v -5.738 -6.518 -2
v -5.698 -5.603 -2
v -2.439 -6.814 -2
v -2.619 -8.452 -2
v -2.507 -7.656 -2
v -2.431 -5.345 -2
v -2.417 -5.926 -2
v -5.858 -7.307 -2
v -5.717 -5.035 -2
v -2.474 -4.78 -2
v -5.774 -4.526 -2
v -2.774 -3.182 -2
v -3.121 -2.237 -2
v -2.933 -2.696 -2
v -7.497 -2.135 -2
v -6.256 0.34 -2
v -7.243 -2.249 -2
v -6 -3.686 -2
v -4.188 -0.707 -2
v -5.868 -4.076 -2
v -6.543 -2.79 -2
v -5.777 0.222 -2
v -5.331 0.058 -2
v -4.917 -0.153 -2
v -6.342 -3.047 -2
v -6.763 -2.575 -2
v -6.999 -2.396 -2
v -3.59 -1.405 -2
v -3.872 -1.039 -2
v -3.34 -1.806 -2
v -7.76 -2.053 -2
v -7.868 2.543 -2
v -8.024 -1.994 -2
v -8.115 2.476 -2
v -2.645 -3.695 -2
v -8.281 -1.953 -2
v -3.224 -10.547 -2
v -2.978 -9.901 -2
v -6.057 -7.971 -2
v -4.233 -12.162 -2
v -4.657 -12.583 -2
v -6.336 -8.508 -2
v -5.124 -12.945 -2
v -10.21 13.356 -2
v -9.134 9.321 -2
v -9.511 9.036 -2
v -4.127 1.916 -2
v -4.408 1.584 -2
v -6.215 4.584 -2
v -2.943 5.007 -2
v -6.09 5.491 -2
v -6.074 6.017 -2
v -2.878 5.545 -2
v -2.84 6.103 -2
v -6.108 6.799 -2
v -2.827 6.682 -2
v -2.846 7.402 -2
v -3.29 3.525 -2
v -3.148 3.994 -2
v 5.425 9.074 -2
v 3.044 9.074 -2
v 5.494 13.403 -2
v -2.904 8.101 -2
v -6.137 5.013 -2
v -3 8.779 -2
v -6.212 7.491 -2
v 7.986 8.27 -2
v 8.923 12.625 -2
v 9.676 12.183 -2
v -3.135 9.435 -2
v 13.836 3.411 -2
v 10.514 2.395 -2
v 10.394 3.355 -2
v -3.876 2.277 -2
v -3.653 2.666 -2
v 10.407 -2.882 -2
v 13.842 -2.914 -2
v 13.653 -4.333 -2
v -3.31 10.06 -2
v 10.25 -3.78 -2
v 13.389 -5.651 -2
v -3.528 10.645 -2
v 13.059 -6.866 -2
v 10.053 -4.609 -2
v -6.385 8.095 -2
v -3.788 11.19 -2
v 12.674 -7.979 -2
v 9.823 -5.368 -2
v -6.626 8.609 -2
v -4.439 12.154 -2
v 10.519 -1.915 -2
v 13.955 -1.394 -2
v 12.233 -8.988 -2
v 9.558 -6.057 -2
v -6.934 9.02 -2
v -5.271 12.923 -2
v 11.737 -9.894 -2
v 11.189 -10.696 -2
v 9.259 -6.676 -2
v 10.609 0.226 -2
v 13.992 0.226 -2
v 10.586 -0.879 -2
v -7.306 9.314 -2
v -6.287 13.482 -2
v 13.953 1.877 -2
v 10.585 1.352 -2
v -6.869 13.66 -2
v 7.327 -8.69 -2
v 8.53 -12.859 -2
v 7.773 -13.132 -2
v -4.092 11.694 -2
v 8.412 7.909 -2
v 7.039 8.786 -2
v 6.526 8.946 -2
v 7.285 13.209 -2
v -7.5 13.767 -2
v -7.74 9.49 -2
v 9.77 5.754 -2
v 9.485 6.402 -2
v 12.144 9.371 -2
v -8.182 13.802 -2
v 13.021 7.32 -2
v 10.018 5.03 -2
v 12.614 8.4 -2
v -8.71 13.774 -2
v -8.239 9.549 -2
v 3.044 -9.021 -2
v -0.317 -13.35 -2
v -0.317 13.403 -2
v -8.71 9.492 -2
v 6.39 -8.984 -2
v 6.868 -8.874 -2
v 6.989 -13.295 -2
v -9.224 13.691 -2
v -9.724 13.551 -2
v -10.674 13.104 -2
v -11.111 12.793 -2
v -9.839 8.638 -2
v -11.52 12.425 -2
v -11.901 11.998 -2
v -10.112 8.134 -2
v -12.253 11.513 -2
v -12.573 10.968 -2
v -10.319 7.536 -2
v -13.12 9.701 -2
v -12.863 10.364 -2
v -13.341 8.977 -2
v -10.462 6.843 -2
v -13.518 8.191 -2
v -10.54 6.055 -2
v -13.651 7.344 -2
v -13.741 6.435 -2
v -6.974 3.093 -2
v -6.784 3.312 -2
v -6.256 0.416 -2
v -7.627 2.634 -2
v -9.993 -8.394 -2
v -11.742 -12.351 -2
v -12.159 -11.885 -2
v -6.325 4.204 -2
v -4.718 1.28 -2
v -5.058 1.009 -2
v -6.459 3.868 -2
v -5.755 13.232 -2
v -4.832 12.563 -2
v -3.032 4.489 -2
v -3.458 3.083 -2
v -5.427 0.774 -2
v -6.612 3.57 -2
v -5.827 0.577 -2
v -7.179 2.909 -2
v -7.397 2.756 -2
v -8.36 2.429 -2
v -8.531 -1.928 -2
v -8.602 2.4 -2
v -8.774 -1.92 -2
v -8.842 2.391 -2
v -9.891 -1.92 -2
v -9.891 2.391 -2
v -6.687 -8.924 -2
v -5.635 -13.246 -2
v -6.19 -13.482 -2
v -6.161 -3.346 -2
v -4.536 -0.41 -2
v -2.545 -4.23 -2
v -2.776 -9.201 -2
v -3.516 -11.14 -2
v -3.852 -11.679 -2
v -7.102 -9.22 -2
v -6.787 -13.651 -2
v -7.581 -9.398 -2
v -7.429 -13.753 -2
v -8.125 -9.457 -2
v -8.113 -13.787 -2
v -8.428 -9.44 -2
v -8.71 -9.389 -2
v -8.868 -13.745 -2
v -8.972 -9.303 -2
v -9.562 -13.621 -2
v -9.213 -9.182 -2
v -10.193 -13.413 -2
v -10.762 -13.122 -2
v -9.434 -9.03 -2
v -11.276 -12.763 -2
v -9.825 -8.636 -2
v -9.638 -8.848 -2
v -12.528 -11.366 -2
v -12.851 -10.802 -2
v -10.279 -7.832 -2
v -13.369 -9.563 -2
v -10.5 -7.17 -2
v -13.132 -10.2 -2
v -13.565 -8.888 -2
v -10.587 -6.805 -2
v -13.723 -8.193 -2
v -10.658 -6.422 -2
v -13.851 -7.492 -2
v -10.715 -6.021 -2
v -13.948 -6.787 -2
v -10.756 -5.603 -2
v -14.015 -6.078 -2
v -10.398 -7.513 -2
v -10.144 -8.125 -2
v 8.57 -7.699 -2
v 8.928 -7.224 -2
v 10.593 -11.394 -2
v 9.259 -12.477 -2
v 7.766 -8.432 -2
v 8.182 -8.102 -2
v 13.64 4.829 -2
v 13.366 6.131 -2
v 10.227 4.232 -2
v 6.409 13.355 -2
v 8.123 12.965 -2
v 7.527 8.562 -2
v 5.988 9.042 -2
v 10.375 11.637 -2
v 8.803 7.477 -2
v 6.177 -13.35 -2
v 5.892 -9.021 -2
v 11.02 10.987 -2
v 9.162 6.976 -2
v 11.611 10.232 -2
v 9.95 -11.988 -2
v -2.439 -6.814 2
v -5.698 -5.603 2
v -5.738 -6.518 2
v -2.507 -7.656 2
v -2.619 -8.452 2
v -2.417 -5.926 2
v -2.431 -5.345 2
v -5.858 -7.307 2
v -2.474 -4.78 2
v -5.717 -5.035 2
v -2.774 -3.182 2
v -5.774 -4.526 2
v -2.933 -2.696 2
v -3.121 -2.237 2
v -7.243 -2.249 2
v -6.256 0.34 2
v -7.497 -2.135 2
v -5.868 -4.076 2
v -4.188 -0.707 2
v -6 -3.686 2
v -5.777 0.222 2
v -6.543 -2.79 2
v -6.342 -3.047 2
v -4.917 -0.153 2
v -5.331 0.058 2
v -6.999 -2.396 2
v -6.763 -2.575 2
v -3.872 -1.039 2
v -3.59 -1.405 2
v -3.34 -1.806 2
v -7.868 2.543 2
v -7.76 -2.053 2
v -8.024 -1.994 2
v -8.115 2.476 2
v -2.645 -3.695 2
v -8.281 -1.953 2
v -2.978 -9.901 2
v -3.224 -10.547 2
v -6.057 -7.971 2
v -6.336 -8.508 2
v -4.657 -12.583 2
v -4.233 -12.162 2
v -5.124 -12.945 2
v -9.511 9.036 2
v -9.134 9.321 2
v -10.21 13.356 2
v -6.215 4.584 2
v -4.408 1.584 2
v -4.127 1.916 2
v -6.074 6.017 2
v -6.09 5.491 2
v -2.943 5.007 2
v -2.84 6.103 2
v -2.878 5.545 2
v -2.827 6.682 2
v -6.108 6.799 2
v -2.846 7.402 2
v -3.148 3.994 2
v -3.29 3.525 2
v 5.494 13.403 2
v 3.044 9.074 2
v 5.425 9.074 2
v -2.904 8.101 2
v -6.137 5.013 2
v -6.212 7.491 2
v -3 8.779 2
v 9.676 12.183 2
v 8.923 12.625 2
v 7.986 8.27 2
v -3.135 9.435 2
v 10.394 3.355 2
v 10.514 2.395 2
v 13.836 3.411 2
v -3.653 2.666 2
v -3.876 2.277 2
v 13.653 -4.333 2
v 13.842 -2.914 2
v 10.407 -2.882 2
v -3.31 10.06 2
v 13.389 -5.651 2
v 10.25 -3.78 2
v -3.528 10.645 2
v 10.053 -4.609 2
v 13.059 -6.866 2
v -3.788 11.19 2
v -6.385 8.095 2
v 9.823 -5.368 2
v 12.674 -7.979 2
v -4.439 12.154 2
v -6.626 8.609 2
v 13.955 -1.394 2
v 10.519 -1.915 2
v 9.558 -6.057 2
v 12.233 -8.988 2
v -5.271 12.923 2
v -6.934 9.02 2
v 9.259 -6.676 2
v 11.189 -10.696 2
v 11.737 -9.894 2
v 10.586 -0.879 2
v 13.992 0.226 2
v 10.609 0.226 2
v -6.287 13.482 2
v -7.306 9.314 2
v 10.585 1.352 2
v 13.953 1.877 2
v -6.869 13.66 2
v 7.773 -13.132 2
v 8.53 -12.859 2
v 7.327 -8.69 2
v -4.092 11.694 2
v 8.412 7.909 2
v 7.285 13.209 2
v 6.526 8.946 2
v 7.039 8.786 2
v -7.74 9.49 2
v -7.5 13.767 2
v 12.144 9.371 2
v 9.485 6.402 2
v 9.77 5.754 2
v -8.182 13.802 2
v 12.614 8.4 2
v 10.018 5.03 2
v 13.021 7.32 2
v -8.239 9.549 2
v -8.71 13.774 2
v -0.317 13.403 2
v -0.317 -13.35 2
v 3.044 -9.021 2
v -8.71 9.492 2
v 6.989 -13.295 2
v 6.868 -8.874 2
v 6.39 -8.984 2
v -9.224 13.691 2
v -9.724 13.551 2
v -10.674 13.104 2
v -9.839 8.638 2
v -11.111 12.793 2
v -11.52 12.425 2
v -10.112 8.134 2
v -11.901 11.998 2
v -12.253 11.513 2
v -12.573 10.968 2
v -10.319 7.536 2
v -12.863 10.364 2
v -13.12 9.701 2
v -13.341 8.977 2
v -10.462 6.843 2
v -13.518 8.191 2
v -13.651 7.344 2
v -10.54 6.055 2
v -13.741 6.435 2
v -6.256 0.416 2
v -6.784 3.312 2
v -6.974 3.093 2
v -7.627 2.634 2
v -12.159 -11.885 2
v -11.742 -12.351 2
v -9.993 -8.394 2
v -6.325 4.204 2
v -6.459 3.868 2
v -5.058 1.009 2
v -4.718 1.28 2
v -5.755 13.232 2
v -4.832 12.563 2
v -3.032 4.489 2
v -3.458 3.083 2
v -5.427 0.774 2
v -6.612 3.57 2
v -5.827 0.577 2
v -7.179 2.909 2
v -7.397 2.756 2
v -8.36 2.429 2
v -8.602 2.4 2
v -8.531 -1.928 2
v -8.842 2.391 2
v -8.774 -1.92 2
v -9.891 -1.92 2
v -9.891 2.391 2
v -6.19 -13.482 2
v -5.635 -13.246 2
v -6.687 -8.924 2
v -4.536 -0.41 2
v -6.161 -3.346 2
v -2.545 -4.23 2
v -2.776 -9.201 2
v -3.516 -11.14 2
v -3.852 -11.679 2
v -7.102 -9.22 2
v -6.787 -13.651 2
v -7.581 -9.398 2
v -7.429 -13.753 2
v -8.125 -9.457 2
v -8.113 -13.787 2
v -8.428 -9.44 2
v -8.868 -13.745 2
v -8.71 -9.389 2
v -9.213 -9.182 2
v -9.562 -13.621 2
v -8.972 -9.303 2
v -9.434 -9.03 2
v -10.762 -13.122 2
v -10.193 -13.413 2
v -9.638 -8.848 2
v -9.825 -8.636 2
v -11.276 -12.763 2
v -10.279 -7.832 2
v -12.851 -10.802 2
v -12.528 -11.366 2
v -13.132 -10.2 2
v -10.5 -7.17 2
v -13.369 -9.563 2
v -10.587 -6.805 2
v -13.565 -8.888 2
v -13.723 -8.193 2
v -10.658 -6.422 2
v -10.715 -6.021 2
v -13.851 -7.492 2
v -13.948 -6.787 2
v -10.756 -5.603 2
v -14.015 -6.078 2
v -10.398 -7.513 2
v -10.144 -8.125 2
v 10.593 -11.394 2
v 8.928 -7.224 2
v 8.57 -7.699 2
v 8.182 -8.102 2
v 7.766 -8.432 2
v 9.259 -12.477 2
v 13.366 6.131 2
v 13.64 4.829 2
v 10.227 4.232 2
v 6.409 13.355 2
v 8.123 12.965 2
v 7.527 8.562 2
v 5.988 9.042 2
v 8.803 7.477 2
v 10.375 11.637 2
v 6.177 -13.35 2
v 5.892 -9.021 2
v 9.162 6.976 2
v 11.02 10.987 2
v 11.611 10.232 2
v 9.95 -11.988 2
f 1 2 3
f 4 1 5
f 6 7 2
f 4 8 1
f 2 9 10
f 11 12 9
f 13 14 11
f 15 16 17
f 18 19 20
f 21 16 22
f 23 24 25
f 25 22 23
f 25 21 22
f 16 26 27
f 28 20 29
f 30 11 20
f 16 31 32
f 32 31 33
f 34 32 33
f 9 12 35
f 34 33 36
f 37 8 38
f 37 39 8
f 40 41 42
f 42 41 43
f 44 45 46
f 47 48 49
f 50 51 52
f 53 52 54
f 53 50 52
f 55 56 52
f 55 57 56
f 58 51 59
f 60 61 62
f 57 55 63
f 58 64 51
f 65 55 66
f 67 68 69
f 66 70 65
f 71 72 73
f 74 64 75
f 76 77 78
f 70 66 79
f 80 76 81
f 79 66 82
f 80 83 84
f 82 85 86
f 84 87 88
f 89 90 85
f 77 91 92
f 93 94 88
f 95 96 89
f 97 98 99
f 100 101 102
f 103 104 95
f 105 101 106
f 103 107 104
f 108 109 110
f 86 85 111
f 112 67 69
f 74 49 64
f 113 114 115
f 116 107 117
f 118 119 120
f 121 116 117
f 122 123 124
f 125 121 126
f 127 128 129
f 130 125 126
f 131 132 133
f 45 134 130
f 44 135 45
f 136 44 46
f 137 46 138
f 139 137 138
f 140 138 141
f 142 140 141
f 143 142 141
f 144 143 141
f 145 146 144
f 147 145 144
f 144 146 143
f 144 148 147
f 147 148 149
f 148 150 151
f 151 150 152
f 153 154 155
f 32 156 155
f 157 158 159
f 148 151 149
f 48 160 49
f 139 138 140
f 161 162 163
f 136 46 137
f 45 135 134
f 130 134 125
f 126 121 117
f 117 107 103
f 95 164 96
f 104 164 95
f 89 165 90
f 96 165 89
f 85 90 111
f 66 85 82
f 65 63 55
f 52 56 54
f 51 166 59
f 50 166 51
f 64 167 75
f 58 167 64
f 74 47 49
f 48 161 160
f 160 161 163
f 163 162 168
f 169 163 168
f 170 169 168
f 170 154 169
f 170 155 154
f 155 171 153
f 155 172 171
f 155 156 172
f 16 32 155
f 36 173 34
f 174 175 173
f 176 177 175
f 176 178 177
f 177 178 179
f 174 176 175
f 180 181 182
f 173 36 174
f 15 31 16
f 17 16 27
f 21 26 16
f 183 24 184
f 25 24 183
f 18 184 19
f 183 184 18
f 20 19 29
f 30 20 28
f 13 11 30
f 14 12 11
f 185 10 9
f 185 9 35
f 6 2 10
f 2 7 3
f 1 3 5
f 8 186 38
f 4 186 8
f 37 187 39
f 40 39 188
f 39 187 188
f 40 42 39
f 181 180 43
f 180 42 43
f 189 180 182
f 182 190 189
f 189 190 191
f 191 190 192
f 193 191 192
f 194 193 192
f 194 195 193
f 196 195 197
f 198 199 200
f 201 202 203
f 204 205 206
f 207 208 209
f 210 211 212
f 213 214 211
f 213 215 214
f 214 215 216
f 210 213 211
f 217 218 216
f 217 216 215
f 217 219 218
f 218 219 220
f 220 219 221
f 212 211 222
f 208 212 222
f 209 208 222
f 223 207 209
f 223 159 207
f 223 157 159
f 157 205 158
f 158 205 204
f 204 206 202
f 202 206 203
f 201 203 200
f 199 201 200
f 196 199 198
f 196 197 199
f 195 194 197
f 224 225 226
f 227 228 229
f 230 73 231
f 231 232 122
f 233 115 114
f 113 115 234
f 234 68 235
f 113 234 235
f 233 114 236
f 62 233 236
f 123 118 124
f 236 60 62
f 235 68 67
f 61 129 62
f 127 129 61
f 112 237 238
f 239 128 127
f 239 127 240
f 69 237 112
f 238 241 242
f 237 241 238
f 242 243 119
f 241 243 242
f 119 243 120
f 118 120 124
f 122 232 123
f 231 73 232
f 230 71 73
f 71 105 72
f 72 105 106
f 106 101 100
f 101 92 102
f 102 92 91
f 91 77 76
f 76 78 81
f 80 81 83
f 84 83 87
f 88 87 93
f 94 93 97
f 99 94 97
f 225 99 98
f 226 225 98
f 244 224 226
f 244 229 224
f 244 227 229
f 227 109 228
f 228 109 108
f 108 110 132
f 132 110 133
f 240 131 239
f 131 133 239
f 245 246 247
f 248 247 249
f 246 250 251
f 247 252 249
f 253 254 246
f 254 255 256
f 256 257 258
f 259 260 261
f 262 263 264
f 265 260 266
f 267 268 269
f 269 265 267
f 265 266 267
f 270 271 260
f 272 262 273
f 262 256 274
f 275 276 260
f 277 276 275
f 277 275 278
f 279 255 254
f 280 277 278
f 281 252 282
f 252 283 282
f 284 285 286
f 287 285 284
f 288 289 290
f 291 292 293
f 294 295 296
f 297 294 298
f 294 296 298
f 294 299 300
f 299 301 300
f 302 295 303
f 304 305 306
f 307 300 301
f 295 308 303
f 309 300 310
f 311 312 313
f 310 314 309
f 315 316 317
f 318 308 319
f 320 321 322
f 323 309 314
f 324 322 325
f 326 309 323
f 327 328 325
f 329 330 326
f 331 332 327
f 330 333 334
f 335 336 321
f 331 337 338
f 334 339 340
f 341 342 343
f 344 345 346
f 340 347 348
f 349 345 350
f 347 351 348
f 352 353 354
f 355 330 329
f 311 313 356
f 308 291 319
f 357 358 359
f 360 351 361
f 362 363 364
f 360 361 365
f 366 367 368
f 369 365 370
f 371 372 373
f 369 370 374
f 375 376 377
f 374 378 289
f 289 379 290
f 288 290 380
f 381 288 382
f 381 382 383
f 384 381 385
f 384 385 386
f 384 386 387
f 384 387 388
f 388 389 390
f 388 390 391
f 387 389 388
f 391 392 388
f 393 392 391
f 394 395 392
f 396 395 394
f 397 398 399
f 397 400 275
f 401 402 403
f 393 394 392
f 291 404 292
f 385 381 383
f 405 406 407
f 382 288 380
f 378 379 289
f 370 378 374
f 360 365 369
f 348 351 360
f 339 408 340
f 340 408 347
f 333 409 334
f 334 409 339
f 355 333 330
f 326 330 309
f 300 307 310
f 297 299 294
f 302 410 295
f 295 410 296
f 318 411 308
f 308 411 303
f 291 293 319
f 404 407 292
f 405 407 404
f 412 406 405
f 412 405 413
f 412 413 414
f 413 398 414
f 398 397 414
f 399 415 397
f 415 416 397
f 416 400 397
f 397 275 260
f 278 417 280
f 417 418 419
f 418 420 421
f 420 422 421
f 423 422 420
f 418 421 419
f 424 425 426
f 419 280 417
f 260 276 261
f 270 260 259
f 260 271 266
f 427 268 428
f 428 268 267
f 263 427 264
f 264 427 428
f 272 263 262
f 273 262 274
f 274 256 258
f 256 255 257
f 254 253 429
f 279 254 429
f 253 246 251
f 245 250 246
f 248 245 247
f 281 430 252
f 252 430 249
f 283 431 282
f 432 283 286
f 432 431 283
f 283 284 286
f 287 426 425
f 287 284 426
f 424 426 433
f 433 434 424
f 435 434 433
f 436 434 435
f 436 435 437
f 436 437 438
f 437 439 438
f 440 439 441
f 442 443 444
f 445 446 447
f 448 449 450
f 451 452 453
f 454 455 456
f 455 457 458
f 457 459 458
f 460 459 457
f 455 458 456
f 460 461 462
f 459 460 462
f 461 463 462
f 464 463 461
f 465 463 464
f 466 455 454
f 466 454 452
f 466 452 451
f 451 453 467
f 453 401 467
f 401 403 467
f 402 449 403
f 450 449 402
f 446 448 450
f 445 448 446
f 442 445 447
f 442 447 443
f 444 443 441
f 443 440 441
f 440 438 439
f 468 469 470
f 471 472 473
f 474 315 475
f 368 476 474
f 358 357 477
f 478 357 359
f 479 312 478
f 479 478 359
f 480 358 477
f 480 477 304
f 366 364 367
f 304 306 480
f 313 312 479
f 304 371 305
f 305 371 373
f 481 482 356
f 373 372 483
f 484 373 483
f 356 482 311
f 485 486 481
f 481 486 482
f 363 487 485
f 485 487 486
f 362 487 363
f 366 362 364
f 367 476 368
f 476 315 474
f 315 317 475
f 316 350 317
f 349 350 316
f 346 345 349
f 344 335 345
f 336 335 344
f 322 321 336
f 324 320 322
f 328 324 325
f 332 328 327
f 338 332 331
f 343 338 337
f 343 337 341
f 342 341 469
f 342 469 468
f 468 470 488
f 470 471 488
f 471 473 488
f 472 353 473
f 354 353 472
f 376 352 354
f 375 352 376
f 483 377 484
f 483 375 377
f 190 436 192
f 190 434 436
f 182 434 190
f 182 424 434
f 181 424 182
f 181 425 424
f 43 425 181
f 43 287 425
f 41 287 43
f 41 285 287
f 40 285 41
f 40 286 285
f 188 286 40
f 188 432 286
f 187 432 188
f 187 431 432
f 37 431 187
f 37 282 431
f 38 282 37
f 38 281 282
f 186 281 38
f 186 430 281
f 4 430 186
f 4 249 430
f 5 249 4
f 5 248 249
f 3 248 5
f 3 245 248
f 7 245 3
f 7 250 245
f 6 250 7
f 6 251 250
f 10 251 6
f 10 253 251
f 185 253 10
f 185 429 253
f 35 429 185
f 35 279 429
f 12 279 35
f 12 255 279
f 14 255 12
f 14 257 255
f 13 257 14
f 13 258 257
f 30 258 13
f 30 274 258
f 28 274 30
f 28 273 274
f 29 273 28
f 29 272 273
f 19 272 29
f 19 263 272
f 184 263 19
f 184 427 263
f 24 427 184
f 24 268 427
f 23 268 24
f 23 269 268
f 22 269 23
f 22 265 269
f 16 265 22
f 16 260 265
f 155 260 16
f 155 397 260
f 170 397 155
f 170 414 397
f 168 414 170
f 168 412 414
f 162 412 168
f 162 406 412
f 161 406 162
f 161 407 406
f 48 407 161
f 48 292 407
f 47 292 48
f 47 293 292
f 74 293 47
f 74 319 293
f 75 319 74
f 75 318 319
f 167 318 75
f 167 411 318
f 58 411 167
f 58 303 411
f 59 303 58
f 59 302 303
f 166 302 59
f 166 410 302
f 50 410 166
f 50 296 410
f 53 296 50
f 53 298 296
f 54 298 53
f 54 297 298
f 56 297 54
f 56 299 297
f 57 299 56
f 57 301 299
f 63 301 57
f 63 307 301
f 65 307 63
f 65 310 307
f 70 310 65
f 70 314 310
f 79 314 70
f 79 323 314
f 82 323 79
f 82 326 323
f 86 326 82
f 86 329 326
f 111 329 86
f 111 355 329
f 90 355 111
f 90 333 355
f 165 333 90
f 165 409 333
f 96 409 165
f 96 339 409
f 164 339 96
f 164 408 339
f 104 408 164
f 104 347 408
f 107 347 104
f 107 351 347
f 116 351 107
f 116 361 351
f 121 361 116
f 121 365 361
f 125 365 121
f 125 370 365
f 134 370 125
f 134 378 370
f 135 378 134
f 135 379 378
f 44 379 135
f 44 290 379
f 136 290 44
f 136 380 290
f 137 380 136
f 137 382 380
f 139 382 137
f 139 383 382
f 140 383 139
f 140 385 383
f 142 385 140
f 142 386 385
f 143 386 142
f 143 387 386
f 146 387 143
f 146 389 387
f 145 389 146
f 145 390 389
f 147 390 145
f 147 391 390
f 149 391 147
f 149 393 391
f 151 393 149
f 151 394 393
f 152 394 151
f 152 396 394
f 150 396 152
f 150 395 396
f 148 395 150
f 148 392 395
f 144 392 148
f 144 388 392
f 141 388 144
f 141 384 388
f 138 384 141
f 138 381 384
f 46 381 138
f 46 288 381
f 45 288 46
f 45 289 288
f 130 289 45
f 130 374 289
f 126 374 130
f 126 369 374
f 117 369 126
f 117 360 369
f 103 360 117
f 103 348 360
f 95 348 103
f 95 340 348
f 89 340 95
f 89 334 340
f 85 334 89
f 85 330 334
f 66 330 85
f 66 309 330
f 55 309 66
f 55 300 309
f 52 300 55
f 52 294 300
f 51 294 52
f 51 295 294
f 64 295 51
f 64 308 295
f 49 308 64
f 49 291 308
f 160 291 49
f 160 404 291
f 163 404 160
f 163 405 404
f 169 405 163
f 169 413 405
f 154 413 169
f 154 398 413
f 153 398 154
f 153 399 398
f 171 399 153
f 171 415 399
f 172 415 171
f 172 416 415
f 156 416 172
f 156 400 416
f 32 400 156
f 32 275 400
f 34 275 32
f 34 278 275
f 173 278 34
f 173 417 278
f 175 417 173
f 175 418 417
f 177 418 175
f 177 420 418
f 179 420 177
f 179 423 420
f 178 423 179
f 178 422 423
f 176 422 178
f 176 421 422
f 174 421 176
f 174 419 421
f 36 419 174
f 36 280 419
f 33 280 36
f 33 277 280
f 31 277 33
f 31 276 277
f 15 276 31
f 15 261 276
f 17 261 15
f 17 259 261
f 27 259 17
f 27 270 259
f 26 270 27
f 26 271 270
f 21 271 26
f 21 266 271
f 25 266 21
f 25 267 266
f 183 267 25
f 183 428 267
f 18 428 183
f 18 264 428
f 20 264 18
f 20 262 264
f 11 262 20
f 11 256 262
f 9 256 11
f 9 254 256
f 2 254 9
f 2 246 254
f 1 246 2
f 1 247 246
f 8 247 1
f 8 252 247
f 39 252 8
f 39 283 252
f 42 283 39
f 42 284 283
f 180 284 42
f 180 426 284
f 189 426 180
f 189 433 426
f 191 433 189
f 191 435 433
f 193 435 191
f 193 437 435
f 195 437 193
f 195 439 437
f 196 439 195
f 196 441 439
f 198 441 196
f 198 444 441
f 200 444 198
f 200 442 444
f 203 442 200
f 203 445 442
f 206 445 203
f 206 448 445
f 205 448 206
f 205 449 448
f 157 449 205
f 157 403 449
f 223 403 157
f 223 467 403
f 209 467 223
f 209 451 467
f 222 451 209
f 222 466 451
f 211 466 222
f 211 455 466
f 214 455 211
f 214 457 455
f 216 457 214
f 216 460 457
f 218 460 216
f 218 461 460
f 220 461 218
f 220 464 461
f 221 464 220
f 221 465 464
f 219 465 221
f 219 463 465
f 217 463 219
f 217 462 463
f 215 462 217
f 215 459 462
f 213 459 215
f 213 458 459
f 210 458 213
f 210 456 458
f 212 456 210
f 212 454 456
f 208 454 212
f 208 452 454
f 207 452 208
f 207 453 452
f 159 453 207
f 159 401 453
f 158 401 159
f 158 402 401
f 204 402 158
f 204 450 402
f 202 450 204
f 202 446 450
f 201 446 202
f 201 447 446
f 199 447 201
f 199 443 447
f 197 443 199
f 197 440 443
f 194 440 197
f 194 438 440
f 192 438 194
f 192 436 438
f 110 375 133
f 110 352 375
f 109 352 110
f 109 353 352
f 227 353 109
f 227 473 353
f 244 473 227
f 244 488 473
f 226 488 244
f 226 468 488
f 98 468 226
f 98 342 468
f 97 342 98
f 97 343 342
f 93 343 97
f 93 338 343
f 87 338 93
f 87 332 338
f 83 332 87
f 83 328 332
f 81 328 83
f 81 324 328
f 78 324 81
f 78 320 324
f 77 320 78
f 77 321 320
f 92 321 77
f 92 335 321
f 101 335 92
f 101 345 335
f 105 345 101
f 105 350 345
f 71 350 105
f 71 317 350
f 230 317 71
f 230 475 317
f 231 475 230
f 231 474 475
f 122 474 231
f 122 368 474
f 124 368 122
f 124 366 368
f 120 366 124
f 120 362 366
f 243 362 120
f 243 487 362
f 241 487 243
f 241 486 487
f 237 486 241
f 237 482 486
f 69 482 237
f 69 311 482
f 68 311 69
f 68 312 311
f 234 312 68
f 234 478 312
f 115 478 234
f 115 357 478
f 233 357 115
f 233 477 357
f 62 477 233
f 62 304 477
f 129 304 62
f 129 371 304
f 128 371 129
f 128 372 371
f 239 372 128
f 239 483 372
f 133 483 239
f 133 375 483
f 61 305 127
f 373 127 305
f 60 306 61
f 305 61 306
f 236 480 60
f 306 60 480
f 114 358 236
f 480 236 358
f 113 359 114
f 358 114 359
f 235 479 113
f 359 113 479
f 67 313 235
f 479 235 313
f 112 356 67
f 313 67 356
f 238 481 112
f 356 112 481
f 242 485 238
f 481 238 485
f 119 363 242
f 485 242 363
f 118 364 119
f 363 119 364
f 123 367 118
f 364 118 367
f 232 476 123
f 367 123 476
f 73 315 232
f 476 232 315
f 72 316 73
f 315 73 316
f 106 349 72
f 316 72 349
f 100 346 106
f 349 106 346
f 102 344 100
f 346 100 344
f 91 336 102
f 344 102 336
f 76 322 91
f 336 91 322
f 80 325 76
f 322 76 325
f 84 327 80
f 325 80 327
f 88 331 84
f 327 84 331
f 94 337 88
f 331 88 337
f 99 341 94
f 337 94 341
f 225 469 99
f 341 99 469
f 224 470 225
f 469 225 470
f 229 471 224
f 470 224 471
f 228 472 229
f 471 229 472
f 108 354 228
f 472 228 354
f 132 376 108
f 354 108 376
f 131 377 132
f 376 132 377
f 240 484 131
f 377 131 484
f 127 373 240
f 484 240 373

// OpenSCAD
// file: modules.scad
c_right_block_lower = [10/255, 10/255, 200/255];
c_right_block_upper = [10/255, 10/255, 100/255];
c_text = [235/255, 69/255, 56/255];
c_left_block = [10/255, 200/255, 10/255];
c_fragment = [0.0, 0.5, 0.5];

module left_logo() {
     translate([-0.5, 0.5, 0])
          translate([-14.05, -13.85, -2])
          color (c_text)
          scale([1.2, 2, 1])
          linear_extrude(4)
          text("3D", font="Liberation Sans:style=Bold", size=14);
}

module left_block() {
     translate([-15, -30, -10]) cube ([30, 60, 40]);
     translate([5, -50, -10]) cube ([10, 100, 40]);

     difference() {
          translate([5, 30, -10]) cylinder(r=20, h=40, $fn=100);
          translate([15, -50, -11]) cube ([150, 100, 42]);
     }
     difference() {
          translate([5, -30, -10]) cylinder(r=20, h=40, $fn=100);
          translate([15, -50, -11]) cube ([150, 100, 42]);       
     }
}

module left_block_puzzle() {
     difference(){
     difference(){
     translate([-15, 0, 0])
     {
          color (c_left_block)
               union() {
                    left_block();
                    translate([25, 0, -10]) cylinder(r=20, h=40, $fn=100);
               }
     }
     color(c_left_block)
          translate([10, 0, 30]) 
          left_logo();
     }
     color(c_left_block)
          translate([10, 0, -10]) 
          rotate([180, 0, 0])
          left_logo();
     }
}

module right_logo() {
     translate([-0.58, 0.4, 0])
          translate([-62.715, -14.29, -2])
          color (c_text)
          scale([1.2, 2, 1])
          linear_extrude(4)
          text("Assemblies", font="Liberation Sans:style=Bold", size=14);
}

module right_block() {
     translate([-70, -30, -10]) cube ([170, 60, 20]);
     translate([-70, -50, -10]) cube ([150, 100, 20]);
     
     translate([80, -30, -10]) cylinder(r=20, h=20, $fn=100);
     translate([80, 30, -10]) cylinder(r=20, h=20, $fn=100);

     //translate([-100, 50, 0]) cube ([40, 5, 20]);
     //translate([60, 50, 0]) cube ([40, 5, 20]);     
}

module right_block_puzzle() {
     translate([-15, 0, 0])
     {
          difference(){
               difference(){
                    difference() {
                         right_block();
                         translate([-60, 0, -11])
                              cylinder(r=20, h=22, $fn=100);
                    }
                    left_anchor_spot();
               }
               right_anchor_spot();
          }
     }
}

module right_block_puzzle_lower() {
     color (c_right_block_lower)
     difference() {
          right_block_puzzle();
          color (c_right_block_lower)
               translate([9, 0, -10])
               rotate([180, 0, 0])
               right_logo();
     }
}

module right_block_puzzle_upper() {
     translate([-15, 0, 0])
     {
          difference(){
               color (c_right_block_upper)
                    difference(){
                    difference(){
                         difference() {
                              right_block();
                              translate([-60, 0, -11])
                                   cylinder(r=20, h=22, $fn=100);
                         }
                         translate([0, 0, -20])
                              left_anchor_spot();
                    }
                    translate([0, 0, -20])
                         right_anchor_spot();
               }
               color (c_right_block_upper)
                    translate([28, 0, 10.001])
                    right_logo();
          }
     }
}

module bolt(){
     translate([0, 0, -15]){
          rotate([0, 0, 30])
               cylinder(r=6, h=5, $fn=6);
          cylinder(r=4, h=30, $fn=100);
     }
}

module nut(){
     translate([0, 0, -2.5])
     difference(){
          cylinder(r=6, h=5, $fn=6);
          translate([0, 0, -1]) cylinder(r=4, h=7, $fn=100);
     }
}

module anchor_hanger(){
     difference(){
          union(){
               translate([-5, 0, 0]) cube ([15, 5, 5]);
               translate([2.5, 5, 0]) cylinder(r=7.5, h=5, $fn=100);
          }
          translate([2.5, 5, -1]) cylinder(r=4, h=7, $fn=100);
     }     
}

module anchor(){
     translate([0, -3.75, 0])
     {
          translate([-7.5, -5, -10]) cube ([15, 5, 20]);
          translate([-2.5, 0, -10]) anchor_hanger();
          translate([-2.5, 0, 5]) anchor_hanger();
     }
}

module left_anchor_spot(){
     translate([-60, 45, 0]) cube ([15, 6, 20]);
}

module right_anchor_spot(){
     translate([45, 45, 0]) cube ([15, 6, 20]);
}

module breaking(){

     translate([120.14, -60.2, -11])
          rotate([0, 0, 90])
          cube ([20, 120, 22]);

     translate([85, -125, -11])
          rotate([0, 0, 45])
          cube ([20, 120, 22]);
     
     translate([105, -125, -11])
          rotate([0, 0, 45])
          cube ([20, 120, 22]);
     
     translate([145, -125, -11])
          rotate([0, 0, 45])
          cube ([30, 120, 22]);

     translate([201.4, -38.93, -11])
          rotate([0, 0, 90])
          cube ([20, 120, 22]);
     
     translate([175, -105, -11])
          rotate([0, 0, 45])
          cube ([30, 120, 22]);
}

module broken_block() {
     intersection(){
          right_block();
          breaking();
     }
}

module broken_block_at_origin() {
     color(c_fragment)
          translate([-85/2, 34.46, 0])
          broken_block();
}

module extended_broken_block() {
     union(){
          broken_block();
          breaking();
     }
}
// main file
include<modules.scad>

//translate([-14.05, -13.85, -2])
//cube ([28.1, 27.7, 4]);

left_logo();
